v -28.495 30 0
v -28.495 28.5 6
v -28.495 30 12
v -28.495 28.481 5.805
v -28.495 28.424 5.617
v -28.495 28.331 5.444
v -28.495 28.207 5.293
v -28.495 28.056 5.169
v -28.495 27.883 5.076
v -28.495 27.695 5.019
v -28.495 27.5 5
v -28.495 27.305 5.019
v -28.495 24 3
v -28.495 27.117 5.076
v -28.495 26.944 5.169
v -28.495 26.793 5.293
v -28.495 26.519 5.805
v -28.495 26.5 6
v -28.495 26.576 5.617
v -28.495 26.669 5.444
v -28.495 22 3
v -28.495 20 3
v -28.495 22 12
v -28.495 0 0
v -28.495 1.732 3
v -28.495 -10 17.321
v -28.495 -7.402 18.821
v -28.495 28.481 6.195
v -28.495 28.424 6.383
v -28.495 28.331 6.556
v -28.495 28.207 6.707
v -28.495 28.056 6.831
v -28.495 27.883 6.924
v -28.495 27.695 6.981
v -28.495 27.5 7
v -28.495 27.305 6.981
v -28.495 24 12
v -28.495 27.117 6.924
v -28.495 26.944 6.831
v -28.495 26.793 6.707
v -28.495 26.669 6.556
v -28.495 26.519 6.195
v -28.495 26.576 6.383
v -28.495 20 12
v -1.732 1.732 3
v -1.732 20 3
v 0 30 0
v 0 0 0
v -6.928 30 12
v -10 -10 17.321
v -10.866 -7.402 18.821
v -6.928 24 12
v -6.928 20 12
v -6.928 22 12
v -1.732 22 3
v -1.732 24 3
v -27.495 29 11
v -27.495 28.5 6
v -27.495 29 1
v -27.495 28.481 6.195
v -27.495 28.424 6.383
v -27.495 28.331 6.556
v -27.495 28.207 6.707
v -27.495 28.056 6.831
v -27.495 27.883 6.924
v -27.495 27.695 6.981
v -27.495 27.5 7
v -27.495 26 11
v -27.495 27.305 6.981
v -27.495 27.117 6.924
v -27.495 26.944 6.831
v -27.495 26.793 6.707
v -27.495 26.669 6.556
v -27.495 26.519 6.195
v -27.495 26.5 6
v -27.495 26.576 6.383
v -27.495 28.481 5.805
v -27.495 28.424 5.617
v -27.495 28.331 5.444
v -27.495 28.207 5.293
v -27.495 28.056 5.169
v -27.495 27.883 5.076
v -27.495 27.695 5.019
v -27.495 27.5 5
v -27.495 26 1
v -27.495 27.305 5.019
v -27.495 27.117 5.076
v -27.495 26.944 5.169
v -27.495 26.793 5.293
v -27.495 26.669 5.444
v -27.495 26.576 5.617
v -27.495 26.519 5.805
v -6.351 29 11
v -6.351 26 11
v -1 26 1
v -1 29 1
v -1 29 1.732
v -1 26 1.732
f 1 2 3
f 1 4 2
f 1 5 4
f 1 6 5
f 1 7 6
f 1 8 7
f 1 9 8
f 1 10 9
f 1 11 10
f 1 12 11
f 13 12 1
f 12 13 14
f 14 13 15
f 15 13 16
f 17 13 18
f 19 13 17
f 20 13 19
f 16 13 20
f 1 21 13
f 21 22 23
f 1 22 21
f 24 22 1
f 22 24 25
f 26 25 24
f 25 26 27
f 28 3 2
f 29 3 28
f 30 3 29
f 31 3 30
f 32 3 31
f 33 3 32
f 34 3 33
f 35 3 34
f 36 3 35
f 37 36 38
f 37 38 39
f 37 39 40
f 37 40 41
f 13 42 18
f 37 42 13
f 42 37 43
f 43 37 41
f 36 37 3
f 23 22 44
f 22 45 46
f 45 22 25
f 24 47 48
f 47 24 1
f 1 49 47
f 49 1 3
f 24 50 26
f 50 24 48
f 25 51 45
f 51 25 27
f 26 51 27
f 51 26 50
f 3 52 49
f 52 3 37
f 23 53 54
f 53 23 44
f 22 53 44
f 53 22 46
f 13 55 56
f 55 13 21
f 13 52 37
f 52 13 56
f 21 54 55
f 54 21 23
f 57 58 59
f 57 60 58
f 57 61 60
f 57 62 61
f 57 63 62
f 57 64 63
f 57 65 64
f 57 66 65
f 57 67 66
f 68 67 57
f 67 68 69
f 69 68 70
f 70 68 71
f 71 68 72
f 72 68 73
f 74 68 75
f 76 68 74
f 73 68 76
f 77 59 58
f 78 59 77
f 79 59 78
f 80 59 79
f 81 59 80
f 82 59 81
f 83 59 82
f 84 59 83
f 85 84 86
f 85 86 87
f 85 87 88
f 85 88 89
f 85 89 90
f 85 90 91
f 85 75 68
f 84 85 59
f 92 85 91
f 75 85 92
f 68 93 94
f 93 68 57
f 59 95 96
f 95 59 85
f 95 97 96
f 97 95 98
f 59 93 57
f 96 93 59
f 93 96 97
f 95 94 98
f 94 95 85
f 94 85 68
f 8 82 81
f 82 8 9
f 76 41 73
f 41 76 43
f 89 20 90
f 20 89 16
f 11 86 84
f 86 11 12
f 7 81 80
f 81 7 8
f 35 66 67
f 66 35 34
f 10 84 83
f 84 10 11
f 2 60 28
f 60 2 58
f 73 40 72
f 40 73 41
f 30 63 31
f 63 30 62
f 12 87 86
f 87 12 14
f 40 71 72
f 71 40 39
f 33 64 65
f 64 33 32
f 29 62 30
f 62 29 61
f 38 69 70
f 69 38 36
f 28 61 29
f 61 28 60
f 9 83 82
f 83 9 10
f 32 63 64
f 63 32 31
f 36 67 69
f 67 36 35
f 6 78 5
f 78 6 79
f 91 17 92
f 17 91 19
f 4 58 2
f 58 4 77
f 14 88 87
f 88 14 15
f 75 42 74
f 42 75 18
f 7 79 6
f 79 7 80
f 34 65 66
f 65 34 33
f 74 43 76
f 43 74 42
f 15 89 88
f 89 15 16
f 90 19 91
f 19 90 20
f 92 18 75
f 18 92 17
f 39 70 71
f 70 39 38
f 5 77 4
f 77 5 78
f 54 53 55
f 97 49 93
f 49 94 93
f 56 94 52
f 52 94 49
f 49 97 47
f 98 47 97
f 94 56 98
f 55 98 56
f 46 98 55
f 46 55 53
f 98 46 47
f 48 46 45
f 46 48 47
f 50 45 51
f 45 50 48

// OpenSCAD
handle_pertrusion = 20;
base_thickness = 3;

handle_angle = 120;
handle_length = 20;
handle_thickness = base_thickness;

handle_z_offset = handle_thickness * sin(90 - (180 - handle_angle));

glass_pane_thickness = 2;
glass_pane_holder_thickness = 2;
magnet_thickness = 3;
magnet_width = 20;
magnet_heigth = 10;
magnet_cover = 1;
magnet_pushout_hole_radius = 1;
glass_pane_holder_heigth = magnet_heigth + 2  * magnet_cover;


cutoff_angle = 60;
cutoff_hypertenuse = (glass_pane_holder_heigth + base_thickness) * sin(cutoff_angle);
cutoff_extend = cutoff_hypertenuse * sin(30);
base_width = magnet_cover + magnet_width + magnet_cover + cutoff_extend;


magnet_hole_x_offset = magnet_cover;

glass_pane_holder_total_thickness = glass_pane_thickness + glass_pane_holder_thickness * 2 + magnet_thickness + magnet_cover;
base_depth = glass_pane_holder_total_thickness + handle_pertrusion; 
magnet_hole_width = magnet_width + cutoff_extend;

handle_overhang = handle_length * sin(90 - (180 - handle_angle));
handle_angle_addition = handle_thickness;

mirror_x = 1;

mirror([mirror_x, 0, 0]) difference() {
    // glass-pane-holder
    union() {
        // top
        cube([base_width, base_depth, base_thickness]);
        // handle
        color("Red") translate([0, sqrt(handle_thickness^2 - handle_z_offset^2), handle_z_offset]) rotate([handle_angle, 0, 0]) cube([base_width, handle_length, handle_thickness]);
        // holder
        translate([0, base_depth - glass_pane_holder_total_thickness, 0]) cube([base_width, glass_pane_holder_total_thickness, glass_pane_holder_heigth]);
    }
    // glass-pane-slit
    translate([0, base_depth - glass_pane_holder_total_thickness + glass_pane_holder_thickness, base_thickness]) cube([base_width, glass_pane_thickness, glass_pane_holder_heigth - base_thickness]);
    // magnet hole
    translate([magnet_hole_x_offset, base_depth - magnet_thickness - magnet_cover, (glass_pane_holder_heigth - magnet_heigth) / 2]) cube([magnet_hole_width, magnet_thickness, magnet_heigth]);
    // magnet removal hole
    translate([0, base_depth - magnet_cover - (magnet_thickness / 2), glass_pane_holder_heigth / 2]) rotate([0, 90, 0])  cylinder(h=base_width, r=magnet_pushout_hole_radius, $fn=32);
    translate([0, 0 - handle_overhang, 0]) rotate([0, 0 - cutoff_angle, 0]) color("Cyan") cube([handle_length + handle_angle_addition, handle_overhang + base_depth, 10]);
}
